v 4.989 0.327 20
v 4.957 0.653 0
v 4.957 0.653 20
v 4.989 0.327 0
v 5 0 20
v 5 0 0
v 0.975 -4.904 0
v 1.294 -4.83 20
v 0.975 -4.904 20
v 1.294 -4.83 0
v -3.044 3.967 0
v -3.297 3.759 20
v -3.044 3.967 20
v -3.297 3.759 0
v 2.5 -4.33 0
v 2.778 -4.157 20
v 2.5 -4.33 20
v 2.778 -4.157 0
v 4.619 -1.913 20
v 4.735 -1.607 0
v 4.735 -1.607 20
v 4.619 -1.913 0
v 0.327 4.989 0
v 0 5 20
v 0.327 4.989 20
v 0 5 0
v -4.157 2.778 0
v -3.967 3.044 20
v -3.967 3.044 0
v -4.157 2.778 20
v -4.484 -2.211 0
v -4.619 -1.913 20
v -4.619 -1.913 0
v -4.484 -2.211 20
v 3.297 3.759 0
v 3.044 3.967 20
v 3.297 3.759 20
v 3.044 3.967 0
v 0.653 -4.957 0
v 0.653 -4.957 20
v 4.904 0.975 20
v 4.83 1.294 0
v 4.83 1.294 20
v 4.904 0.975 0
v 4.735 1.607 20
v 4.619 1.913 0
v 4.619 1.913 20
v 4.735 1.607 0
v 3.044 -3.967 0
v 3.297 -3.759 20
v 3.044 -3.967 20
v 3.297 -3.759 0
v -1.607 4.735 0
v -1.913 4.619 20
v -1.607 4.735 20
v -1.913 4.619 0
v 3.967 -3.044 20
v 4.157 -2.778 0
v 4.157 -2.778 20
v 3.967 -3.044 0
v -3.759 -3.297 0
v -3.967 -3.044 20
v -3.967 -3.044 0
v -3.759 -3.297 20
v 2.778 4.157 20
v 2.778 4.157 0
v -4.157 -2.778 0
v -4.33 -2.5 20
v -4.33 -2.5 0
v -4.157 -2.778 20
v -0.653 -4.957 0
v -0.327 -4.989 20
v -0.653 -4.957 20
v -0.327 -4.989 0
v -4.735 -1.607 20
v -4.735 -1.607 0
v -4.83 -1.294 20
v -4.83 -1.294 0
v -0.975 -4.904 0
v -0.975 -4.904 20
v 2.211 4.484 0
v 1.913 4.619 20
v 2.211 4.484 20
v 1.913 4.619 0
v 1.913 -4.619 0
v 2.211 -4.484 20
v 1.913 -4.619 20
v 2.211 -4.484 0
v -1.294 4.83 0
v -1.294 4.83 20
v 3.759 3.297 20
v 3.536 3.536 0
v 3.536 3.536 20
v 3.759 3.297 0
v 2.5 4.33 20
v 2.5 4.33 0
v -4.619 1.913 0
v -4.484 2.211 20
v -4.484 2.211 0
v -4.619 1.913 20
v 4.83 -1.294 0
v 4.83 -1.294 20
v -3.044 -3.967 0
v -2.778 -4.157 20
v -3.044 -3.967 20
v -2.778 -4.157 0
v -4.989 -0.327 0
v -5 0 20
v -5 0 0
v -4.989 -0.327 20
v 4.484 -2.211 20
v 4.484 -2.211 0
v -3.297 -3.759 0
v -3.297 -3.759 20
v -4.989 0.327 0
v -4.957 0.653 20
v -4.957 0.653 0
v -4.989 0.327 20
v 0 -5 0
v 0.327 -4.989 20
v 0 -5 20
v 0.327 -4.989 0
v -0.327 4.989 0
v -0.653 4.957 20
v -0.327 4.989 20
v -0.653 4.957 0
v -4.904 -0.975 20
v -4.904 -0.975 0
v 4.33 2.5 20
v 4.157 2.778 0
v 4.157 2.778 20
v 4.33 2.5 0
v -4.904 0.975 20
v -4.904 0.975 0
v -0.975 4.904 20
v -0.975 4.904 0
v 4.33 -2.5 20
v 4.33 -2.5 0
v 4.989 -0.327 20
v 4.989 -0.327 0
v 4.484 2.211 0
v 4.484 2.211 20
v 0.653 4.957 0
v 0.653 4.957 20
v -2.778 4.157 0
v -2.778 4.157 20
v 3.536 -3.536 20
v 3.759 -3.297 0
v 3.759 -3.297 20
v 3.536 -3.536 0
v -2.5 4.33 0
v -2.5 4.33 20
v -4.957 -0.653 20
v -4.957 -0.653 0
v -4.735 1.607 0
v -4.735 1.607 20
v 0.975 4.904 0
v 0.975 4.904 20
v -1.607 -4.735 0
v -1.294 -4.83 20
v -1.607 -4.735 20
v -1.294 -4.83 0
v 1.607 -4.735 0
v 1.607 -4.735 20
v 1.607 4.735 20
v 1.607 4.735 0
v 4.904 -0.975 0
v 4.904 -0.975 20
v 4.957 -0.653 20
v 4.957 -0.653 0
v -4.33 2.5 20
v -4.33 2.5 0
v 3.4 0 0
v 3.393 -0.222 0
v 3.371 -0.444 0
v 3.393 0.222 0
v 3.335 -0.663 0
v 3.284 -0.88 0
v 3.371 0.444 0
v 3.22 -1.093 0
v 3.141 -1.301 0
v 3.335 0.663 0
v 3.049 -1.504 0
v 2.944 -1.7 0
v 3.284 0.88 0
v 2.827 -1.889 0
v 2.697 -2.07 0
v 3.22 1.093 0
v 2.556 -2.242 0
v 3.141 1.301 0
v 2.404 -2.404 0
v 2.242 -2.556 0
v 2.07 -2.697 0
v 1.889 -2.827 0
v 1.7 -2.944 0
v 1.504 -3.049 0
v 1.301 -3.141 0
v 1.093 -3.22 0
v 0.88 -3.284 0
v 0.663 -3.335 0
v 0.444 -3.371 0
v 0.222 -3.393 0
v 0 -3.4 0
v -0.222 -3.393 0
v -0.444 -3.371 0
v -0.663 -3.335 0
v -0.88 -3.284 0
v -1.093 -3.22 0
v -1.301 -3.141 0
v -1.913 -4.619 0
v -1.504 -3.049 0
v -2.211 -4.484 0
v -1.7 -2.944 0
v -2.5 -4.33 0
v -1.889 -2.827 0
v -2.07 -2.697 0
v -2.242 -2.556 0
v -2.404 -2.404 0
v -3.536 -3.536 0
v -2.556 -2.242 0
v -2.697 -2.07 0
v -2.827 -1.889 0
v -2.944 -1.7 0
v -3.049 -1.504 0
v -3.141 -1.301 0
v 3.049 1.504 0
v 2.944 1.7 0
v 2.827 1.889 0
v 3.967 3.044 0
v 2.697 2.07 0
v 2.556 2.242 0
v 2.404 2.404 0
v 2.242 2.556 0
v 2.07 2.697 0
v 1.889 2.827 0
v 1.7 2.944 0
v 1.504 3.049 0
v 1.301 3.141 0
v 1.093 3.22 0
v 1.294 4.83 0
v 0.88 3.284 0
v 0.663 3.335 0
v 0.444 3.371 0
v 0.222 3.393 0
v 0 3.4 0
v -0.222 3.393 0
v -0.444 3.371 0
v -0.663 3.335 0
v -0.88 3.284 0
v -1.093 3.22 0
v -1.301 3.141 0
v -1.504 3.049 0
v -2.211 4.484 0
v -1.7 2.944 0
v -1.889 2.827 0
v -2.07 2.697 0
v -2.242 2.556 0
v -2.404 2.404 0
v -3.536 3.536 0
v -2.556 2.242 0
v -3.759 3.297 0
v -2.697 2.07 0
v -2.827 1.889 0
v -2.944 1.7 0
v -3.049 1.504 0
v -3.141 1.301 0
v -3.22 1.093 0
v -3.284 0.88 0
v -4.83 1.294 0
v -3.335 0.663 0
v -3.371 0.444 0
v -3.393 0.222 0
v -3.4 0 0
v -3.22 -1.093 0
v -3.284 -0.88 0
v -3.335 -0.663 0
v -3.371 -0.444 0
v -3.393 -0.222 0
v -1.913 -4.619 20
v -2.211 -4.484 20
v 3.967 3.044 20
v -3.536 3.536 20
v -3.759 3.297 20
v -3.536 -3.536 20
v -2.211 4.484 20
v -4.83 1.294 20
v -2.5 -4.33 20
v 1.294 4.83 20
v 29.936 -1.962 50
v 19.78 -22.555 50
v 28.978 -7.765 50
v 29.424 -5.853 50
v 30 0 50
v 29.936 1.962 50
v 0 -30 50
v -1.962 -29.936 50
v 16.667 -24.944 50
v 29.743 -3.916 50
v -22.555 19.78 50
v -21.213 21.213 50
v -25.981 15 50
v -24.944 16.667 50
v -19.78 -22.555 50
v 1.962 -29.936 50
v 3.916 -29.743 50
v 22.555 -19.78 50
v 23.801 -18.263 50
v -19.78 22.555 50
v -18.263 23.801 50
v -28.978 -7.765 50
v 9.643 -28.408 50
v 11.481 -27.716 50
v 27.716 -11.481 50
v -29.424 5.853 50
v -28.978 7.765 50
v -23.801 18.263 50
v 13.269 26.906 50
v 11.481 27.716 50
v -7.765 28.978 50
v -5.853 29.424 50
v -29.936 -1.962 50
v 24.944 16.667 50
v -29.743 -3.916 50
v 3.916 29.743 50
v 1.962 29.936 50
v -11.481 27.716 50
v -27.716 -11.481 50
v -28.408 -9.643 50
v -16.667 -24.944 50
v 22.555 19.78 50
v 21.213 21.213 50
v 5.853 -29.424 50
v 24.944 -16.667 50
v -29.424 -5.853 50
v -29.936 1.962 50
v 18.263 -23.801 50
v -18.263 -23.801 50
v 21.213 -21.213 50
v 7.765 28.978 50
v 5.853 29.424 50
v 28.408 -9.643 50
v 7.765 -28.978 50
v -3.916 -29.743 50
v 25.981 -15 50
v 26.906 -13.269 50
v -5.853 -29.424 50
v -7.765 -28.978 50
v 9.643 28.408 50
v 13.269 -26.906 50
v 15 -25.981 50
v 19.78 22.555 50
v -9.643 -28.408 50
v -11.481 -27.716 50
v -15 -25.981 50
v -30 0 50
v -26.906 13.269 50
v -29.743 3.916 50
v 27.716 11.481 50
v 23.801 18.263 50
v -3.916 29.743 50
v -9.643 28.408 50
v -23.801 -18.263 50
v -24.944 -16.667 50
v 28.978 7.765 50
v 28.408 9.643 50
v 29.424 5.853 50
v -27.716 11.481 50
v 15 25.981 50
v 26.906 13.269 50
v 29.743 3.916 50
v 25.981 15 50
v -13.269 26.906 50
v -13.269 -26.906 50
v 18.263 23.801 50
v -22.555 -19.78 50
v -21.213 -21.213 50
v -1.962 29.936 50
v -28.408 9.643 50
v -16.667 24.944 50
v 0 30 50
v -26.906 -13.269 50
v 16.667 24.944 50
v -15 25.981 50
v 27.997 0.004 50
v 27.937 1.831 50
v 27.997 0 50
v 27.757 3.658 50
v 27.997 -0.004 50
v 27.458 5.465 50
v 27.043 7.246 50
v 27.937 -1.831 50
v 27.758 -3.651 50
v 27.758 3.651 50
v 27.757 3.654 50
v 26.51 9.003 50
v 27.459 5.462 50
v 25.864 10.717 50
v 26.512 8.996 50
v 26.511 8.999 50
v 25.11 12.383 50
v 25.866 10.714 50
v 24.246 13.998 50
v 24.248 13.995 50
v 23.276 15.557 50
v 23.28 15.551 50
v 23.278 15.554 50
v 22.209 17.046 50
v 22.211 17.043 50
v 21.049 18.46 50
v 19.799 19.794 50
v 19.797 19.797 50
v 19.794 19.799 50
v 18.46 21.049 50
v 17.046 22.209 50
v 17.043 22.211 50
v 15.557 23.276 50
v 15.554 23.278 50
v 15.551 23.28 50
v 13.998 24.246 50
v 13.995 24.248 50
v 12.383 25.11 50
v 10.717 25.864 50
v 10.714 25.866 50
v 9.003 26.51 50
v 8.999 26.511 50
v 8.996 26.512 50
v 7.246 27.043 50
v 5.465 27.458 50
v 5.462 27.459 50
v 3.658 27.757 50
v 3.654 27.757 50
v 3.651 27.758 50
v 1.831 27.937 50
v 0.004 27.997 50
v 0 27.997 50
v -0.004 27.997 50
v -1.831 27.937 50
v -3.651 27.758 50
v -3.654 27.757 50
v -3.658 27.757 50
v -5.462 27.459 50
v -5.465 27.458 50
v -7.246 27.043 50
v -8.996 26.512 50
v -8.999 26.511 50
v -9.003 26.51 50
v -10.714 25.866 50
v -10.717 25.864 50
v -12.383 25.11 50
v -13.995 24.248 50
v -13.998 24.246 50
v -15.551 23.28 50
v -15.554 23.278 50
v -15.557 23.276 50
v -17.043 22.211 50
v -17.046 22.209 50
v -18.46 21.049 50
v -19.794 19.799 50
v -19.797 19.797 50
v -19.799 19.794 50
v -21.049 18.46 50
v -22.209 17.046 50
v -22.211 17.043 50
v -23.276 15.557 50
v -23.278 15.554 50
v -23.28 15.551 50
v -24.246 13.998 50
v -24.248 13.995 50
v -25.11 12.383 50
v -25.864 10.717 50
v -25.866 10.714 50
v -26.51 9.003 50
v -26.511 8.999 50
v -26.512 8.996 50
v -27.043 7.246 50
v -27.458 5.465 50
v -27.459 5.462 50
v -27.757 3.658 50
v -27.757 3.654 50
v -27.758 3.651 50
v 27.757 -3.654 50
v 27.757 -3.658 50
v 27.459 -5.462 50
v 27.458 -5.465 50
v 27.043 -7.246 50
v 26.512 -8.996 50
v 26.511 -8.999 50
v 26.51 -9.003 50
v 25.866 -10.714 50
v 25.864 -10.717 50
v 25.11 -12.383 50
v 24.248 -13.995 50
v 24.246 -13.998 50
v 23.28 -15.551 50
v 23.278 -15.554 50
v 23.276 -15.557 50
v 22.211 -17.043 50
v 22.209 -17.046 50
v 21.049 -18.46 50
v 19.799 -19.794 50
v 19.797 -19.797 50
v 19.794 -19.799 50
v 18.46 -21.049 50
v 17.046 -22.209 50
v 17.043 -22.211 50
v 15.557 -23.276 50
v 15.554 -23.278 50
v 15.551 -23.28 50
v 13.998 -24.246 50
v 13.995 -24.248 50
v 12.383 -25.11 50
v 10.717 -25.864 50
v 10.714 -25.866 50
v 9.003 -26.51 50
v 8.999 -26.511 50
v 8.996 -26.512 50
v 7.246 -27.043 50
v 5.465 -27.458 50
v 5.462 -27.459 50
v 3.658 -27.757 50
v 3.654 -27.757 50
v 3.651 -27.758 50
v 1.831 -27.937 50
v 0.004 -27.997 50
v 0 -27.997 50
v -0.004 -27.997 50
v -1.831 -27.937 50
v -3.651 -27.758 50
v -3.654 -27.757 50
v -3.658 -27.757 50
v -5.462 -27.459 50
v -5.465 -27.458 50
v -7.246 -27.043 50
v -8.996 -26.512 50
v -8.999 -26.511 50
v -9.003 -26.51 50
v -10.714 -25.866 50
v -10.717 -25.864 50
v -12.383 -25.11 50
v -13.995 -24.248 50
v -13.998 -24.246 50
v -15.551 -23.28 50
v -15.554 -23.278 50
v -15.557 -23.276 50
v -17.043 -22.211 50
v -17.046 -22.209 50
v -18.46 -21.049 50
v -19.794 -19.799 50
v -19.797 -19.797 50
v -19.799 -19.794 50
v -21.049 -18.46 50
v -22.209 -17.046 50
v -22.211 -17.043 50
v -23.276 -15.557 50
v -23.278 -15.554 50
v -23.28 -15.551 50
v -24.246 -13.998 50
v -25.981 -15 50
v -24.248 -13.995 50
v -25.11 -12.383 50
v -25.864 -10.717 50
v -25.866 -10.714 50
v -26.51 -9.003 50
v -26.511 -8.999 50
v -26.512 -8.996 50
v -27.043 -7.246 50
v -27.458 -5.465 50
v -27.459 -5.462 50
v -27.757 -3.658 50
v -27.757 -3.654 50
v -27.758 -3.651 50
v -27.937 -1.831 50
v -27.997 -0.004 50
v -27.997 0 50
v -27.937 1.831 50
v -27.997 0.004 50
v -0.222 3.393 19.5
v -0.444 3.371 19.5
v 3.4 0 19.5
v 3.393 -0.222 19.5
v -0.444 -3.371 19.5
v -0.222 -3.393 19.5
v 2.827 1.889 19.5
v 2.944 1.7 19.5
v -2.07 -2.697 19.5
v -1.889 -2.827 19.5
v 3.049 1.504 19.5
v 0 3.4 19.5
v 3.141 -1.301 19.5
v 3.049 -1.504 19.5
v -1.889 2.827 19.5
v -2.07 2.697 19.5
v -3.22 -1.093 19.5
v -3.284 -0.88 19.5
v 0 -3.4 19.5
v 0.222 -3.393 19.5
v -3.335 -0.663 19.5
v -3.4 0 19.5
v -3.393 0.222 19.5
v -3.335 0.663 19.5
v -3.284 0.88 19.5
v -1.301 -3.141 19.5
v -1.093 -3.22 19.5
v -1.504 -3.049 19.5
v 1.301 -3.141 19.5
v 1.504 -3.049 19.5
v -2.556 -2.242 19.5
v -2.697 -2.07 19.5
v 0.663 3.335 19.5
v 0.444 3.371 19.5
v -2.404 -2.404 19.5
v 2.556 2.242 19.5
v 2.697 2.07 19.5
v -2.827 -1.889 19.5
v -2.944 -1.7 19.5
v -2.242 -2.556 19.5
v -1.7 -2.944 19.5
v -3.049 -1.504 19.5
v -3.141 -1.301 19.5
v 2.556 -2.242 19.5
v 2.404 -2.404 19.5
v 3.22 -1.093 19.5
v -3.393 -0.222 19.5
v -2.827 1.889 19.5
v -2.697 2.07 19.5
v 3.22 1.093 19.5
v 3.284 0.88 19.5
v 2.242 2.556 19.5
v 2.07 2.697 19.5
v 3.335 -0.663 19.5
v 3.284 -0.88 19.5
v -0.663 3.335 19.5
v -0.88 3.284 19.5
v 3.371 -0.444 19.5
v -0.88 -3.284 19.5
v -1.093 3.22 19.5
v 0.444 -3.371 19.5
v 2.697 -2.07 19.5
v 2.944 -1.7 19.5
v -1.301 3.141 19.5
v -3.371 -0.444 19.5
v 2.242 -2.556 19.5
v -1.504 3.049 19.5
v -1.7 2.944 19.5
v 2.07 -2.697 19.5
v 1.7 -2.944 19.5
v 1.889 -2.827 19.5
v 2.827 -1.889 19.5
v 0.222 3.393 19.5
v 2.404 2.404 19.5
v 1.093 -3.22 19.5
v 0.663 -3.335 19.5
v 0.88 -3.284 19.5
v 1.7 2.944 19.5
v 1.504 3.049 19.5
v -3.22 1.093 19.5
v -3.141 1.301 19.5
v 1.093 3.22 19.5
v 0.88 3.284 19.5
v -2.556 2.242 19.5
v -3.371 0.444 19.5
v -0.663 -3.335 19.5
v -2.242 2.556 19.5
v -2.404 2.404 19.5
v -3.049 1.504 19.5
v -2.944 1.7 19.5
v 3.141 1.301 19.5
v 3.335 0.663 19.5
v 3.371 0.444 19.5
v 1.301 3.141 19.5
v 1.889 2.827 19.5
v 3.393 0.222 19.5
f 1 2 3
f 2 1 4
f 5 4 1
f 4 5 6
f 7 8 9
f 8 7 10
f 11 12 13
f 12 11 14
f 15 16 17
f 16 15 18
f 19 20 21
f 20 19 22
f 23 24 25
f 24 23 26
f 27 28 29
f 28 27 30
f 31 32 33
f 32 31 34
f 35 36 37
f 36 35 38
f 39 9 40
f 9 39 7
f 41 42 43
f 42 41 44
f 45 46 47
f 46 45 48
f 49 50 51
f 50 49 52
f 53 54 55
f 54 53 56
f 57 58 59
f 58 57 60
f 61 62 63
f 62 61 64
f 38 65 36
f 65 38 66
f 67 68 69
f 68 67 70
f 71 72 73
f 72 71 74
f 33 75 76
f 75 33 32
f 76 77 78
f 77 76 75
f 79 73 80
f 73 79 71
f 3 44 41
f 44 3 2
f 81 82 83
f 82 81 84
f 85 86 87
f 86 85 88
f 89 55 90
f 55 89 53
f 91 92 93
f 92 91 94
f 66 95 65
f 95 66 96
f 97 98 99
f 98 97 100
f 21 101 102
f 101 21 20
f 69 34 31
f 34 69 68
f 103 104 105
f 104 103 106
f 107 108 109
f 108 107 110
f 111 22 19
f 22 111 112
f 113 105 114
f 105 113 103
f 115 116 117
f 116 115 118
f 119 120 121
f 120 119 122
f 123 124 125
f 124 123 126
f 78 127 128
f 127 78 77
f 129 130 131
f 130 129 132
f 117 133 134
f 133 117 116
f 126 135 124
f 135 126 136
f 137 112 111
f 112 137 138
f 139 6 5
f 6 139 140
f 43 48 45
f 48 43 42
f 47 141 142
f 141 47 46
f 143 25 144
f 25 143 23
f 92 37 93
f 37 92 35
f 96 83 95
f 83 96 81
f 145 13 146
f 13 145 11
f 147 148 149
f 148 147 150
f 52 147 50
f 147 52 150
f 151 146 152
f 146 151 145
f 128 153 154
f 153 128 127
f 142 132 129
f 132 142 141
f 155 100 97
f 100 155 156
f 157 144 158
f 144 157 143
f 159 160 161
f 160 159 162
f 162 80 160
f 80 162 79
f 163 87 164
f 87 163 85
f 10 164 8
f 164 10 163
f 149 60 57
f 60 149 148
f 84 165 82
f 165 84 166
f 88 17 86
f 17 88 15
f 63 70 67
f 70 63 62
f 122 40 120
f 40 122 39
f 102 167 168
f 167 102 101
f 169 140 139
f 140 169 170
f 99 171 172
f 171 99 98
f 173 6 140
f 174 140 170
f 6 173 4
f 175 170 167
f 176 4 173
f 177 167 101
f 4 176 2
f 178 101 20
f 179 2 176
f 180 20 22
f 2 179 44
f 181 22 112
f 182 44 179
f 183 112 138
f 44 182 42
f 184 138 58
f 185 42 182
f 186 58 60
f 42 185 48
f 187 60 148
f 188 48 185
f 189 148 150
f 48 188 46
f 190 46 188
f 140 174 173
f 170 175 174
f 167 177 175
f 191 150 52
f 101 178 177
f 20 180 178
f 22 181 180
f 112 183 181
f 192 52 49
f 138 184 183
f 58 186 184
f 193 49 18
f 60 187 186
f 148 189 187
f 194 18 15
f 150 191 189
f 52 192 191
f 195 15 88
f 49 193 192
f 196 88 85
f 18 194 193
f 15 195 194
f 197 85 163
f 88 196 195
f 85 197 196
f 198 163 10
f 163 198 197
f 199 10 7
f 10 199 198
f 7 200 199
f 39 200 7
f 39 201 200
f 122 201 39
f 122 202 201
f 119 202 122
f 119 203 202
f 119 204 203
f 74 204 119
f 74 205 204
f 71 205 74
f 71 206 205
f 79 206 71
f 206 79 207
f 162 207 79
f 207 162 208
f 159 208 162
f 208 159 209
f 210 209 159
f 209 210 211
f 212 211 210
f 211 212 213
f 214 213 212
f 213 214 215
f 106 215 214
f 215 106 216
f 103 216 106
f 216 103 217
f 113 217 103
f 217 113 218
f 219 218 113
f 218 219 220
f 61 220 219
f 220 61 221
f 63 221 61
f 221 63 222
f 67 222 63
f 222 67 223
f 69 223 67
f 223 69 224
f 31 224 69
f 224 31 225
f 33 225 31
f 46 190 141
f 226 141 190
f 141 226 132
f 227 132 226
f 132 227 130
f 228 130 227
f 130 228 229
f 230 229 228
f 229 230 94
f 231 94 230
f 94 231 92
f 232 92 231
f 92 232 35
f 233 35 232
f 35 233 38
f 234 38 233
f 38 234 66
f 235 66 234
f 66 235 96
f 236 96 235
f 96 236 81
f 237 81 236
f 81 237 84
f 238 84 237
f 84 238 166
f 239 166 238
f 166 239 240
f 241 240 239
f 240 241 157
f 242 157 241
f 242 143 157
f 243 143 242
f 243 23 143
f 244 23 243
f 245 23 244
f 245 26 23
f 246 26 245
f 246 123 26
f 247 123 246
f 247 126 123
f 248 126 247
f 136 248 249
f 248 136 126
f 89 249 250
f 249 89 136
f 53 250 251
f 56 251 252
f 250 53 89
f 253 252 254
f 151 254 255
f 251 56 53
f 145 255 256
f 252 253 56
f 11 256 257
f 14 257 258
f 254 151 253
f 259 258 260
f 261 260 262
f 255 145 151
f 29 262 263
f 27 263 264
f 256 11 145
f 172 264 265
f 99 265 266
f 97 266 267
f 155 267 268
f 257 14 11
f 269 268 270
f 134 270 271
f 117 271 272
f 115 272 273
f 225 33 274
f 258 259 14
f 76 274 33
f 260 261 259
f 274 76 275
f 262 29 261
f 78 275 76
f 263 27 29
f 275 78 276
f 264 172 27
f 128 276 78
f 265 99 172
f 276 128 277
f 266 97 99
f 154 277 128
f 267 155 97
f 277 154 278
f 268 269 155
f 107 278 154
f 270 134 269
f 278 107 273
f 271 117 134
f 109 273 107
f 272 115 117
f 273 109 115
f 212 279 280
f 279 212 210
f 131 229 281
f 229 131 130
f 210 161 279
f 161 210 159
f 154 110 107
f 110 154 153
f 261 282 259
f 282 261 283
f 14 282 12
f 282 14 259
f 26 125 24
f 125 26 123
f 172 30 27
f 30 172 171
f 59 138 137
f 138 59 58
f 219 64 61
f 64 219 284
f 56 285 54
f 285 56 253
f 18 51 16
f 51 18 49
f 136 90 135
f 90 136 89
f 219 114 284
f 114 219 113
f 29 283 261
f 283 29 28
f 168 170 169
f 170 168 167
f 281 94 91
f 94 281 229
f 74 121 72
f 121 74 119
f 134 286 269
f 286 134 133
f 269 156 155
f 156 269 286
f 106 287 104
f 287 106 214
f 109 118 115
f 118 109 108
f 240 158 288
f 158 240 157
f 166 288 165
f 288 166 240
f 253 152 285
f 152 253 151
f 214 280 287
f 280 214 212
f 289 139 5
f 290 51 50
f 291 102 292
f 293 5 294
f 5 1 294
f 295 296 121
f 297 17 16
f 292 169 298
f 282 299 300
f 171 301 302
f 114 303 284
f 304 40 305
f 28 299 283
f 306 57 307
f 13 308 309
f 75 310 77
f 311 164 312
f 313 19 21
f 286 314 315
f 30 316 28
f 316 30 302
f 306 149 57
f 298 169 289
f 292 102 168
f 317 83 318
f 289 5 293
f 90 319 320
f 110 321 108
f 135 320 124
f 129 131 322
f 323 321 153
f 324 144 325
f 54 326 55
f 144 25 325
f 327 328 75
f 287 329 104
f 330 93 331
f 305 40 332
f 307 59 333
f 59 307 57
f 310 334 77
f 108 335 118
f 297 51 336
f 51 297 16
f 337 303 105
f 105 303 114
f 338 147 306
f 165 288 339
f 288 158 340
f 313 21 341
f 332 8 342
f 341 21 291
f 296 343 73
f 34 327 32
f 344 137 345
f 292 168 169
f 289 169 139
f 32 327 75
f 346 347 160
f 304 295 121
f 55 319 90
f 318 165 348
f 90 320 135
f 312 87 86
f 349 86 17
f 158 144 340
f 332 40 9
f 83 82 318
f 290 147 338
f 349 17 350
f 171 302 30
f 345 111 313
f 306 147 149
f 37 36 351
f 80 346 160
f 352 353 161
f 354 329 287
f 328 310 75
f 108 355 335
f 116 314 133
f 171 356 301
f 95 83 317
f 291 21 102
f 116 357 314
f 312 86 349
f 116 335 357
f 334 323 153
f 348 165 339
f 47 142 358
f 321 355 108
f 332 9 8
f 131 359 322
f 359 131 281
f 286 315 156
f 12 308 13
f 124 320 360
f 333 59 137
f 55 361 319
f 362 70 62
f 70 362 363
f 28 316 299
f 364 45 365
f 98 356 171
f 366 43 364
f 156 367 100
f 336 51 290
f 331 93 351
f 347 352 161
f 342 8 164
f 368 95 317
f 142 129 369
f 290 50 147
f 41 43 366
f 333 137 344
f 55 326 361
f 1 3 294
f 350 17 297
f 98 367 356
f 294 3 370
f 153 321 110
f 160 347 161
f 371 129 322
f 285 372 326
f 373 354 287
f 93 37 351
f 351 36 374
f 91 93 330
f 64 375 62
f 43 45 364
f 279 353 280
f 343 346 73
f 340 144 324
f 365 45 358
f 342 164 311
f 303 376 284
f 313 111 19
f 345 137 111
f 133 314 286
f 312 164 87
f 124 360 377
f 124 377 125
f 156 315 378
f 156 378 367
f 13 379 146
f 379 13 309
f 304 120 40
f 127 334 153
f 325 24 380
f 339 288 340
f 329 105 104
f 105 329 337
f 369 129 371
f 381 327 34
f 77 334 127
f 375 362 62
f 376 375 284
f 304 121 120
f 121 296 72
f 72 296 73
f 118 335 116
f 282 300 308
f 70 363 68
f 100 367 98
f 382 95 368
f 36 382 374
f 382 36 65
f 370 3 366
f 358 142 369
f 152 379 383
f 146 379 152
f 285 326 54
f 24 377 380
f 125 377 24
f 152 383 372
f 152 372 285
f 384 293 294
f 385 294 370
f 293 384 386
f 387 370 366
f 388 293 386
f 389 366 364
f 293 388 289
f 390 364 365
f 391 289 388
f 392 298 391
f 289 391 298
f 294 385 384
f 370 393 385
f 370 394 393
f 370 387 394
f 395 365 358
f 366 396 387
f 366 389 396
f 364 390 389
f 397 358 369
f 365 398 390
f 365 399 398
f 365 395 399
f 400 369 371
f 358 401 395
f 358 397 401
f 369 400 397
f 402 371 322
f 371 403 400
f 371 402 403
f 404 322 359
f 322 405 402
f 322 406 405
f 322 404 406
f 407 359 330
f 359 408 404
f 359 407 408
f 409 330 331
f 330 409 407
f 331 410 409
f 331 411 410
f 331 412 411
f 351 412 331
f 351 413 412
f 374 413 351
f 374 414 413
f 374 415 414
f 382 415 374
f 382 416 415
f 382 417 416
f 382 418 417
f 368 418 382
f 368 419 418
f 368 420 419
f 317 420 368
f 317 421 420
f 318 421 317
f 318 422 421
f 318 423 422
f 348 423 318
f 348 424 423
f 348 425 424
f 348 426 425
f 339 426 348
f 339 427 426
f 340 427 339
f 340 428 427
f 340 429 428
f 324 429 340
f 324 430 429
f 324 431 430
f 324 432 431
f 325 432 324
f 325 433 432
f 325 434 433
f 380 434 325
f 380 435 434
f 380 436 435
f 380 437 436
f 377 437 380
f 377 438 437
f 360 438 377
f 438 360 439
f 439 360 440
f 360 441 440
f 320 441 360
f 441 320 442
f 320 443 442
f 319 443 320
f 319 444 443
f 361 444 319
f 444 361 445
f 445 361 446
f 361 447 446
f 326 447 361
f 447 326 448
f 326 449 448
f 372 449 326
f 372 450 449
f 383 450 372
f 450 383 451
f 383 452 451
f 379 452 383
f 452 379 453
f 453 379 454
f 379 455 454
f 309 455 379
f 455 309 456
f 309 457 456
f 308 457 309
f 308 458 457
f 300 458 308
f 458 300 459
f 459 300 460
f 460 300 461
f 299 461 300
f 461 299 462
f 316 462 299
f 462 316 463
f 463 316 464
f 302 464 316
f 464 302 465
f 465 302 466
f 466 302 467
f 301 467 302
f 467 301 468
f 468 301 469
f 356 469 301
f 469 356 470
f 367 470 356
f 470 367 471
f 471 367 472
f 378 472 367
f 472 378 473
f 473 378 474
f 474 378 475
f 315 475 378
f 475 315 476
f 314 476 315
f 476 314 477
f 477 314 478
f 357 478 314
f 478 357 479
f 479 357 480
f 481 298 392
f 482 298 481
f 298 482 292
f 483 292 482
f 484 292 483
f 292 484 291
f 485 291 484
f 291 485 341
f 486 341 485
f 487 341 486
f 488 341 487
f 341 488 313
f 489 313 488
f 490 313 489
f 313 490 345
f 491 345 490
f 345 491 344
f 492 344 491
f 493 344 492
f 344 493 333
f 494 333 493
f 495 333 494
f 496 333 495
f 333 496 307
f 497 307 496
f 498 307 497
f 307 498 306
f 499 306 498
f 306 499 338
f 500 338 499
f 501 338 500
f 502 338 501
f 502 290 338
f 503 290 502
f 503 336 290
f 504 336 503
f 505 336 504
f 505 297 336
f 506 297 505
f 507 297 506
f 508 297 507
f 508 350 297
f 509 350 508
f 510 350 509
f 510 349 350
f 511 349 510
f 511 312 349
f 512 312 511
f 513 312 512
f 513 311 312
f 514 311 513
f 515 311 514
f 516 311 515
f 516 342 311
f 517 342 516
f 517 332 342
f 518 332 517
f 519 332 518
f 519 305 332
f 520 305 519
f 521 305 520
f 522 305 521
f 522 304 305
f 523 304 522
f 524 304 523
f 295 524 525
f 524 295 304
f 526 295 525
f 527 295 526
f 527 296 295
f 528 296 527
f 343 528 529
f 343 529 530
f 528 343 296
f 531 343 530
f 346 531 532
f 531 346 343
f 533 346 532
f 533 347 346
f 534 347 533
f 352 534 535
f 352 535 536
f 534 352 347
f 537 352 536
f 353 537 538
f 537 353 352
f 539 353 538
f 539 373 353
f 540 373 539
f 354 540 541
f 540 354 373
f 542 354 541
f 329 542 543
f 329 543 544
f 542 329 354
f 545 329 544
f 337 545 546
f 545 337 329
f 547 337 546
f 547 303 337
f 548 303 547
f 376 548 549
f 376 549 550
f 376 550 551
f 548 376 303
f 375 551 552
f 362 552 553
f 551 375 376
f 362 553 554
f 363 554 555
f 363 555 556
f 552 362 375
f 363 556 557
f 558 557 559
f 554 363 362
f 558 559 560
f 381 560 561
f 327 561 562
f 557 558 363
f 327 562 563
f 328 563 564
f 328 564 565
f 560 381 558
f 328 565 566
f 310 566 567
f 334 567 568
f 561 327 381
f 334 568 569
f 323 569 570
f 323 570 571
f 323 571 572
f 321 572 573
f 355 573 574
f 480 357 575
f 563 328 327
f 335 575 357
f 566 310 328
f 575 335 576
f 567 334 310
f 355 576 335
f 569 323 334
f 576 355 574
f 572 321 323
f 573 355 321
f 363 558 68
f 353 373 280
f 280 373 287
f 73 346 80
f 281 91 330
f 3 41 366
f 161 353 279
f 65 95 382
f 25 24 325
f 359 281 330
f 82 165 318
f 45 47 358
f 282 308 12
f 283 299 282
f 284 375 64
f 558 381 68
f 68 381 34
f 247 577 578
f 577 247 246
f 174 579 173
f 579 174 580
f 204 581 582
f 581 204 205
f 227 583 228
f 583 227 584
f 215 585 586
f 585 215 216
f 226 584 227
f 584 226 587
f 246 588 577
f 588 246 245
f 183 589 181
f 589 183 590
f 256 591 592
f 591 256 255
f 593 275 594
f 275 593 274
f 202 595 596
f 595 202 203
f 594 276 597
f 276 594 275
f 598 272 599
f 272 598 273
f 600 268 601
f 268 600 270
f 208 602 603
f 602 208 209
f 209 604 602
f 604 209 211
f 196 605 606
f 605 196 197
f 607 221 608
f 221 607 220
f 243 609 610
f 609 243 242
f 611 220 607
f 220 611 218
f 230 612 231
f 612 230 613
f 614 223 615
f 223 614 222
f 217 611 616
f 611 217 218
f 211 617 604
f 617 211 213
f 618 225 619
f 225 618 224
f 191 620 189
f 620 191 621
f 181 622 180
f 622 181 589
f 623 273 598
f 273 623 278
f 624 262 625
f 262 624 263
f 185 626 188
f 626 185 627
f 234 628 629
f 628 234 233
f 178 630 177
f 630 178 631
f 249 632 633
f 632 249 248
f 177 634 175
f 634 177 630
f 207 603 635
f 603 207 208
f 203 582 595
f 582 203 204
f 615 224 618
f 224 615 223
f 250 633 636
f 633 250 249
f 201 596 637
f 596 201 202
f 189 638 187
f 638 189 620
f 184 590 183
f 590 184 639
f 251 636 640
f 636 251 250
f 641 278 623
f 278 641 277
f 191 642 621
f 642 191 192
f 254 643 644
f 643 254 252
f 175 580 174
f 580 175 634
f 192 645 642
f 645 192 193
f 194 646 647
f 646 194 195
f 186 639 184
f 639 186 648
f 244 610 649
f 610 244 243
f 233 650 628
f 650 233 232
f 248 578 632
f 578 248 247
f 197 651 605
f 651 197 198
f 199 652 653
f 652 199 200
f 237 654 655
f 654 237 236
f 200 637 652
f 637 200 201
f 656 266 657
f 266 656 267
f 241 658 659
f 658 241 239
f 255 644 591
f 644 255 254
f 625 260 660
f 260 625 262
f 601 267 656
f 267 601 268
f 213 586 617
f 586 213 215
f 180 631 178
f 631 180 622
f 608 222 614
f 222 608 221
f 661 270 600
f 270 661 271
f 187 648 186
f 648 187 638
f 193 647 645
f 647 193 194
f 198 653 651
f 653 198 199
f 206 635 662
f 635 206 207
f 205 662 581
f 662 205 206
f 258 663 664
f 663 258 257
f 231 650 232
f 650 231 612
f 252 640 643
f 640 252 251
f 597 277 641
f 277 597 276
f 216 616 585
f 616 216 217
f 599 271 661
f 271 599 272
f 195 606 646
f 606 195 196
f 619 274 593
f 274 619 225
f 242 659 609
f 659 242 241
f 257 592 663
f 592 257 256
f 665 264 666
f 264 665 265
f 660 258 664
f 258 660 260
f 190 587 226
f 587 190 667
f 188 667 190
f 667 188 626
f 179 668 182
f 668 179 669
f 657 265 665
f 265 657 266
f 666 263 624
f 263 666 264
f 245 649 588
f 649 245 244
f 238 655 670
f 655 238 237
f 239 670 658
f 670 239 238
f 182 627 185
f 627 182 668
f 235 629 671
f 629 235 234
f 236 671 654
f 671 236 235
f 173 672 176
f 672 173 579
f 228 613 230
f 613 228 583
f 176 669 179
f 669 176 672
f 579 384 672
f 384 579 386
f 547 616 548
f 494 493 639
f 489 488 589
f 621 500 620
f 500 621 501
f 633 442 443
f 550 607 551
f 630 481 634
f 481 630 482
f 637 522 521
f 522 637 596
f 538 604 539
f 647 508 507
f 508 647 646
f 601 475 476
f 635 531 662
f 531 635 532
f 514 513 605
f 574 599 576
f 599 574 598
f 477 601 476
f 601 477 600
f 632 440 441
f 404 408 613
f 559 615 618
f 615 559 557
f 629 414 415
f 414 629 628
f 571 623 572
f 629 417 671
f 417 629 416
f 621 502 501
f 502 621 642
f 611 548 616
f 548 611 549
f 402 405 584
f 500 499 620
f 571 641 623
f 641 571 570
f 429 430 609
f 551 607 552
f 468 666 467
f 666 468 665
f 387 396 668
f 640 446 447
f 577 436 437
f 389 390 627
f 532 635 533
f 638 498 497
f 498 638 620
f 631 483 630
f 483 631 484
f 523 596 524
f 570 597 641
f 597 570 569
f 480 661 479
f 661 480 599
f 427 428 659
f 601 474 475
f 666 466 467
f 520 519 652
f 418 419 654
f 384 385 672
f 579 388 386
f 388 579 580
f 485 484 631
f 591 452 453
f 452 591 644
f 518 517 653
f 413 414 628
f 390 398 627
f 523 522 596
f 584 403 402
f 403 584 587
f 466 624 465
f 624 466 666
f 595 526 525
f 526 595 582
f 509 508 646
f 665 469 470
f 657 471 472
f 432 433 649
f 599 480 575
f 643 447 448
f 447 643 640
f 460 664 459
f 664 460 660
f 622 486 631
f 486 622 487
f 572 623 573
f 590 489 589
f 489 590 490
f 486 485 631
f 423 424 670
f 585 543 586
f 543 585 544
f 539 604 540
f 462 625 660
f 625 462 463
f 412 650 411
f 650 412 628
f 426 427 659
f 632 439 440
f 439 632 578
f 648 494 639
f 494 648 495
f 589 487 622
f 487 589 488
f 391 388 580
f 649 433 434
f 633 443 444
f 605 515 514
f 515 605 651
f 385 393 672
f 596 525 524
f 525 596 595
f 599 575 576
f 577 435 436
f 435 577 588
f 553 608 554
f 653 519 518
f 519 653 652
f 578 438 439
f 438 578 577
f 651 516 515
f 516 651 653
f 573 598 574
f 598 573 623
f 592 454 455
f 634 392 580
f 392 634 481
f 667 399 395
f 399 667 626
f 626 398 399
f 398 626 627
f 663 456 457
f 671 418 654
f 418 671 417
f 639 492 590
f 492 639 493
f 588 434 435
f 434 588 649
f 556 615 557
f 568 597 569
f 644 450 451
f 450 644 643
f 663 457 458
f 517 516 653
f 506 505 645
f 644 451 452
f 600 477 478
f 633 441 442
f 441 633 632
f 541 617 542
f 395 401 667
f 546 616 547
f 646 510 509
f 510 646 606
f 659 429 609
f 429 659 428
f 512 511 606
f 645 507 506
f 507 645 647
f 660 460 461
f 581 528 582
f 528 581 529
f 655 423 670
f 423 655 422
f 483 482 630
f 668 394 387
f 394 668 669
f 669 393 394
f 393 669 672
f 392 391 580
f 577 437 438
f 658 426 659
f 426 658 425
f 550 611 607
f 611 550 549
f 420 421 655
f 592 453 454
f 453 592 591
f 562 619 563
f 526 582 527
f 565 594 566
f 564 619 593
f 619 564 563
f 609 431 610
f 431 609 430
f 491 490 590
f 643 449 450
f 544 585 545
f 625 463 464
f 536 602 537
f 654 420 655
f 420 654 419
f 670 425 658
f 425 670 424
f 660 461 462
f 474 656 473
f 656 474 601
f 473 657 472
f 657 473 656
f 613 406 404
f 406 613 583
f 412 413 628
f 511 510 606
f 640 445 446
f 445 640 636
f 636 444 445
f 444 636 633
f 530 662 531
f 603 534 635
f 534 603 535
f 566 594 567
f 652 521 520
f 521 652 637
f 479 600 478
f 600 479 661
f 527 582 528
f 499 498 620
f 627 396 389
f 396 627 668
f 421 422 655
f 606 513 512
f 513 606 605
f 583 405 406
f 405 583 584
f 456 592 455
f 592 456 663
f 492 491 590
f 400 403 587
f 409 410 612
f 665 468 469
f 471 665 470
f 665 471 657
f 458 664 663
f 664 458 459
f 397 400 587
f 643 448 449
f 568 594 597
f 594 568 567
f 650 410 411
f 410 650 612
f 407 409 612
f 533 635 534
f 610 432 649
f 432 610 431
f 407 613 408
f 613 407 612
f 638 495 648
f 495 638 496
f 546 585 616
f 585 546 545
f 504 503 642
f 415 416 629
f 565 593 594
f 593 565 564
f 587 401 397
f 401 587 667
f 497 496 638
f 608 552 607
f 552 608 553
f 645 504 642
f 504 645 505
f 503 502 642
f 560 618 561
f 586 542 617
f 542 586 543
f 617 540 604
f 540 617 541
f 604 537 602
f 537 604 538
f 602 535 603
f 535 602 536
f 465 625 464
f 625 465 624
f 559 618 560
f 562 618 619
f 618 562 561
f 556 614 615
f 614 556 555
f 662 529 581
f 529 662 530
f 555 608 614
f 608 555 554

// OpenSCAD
// Lab funnel - printed upright, open at top and bottom
// Units: mm

// ---- Parameters ----
spout_od      = 10;    // spout outer diameter
spout_h       = 20;    // spout height (z = 0 to 20)
cone_od_top   = 60;    // funnel rim outer diameter (z = 50)
cone_h        = 30;    // cone height (z = 20 to 50)
wall          = 1.6;   // wall thickness everywhere
eps           = 0.5;   // cutter overshoot past faces

$fn = 96;

// ---- Derived ----
spout_id = spout_od - 2 * wall;   // bore diameter (6.8 mm)
cone_id  = cone_od_top - 2 * wall; // inner diameter at rim (56.8 mm)

// ---- Model ----
difference() {
    union() {
        // Spout (tube)
        cylinder(d = spout_od, h = spout_h);
        // Cone (frustum)
        translate([0, 0, spout_h])
            cylinder(d1 = spout_od, d2 = cone_od_top, h = cone_h);
    }
    // Through-bore: spout bore + cone inner volume (open top and bottom)
    translate([0, 0, -eps])
        linear_extrude(height = spout_h + 2 * eps)
            circle(d = spout_id);
    translate([0, 0, spout_h - eps])
        cylinder(d1 = spout_id, d2 = cone_id, h = cone_h + 2 * eps);
}
